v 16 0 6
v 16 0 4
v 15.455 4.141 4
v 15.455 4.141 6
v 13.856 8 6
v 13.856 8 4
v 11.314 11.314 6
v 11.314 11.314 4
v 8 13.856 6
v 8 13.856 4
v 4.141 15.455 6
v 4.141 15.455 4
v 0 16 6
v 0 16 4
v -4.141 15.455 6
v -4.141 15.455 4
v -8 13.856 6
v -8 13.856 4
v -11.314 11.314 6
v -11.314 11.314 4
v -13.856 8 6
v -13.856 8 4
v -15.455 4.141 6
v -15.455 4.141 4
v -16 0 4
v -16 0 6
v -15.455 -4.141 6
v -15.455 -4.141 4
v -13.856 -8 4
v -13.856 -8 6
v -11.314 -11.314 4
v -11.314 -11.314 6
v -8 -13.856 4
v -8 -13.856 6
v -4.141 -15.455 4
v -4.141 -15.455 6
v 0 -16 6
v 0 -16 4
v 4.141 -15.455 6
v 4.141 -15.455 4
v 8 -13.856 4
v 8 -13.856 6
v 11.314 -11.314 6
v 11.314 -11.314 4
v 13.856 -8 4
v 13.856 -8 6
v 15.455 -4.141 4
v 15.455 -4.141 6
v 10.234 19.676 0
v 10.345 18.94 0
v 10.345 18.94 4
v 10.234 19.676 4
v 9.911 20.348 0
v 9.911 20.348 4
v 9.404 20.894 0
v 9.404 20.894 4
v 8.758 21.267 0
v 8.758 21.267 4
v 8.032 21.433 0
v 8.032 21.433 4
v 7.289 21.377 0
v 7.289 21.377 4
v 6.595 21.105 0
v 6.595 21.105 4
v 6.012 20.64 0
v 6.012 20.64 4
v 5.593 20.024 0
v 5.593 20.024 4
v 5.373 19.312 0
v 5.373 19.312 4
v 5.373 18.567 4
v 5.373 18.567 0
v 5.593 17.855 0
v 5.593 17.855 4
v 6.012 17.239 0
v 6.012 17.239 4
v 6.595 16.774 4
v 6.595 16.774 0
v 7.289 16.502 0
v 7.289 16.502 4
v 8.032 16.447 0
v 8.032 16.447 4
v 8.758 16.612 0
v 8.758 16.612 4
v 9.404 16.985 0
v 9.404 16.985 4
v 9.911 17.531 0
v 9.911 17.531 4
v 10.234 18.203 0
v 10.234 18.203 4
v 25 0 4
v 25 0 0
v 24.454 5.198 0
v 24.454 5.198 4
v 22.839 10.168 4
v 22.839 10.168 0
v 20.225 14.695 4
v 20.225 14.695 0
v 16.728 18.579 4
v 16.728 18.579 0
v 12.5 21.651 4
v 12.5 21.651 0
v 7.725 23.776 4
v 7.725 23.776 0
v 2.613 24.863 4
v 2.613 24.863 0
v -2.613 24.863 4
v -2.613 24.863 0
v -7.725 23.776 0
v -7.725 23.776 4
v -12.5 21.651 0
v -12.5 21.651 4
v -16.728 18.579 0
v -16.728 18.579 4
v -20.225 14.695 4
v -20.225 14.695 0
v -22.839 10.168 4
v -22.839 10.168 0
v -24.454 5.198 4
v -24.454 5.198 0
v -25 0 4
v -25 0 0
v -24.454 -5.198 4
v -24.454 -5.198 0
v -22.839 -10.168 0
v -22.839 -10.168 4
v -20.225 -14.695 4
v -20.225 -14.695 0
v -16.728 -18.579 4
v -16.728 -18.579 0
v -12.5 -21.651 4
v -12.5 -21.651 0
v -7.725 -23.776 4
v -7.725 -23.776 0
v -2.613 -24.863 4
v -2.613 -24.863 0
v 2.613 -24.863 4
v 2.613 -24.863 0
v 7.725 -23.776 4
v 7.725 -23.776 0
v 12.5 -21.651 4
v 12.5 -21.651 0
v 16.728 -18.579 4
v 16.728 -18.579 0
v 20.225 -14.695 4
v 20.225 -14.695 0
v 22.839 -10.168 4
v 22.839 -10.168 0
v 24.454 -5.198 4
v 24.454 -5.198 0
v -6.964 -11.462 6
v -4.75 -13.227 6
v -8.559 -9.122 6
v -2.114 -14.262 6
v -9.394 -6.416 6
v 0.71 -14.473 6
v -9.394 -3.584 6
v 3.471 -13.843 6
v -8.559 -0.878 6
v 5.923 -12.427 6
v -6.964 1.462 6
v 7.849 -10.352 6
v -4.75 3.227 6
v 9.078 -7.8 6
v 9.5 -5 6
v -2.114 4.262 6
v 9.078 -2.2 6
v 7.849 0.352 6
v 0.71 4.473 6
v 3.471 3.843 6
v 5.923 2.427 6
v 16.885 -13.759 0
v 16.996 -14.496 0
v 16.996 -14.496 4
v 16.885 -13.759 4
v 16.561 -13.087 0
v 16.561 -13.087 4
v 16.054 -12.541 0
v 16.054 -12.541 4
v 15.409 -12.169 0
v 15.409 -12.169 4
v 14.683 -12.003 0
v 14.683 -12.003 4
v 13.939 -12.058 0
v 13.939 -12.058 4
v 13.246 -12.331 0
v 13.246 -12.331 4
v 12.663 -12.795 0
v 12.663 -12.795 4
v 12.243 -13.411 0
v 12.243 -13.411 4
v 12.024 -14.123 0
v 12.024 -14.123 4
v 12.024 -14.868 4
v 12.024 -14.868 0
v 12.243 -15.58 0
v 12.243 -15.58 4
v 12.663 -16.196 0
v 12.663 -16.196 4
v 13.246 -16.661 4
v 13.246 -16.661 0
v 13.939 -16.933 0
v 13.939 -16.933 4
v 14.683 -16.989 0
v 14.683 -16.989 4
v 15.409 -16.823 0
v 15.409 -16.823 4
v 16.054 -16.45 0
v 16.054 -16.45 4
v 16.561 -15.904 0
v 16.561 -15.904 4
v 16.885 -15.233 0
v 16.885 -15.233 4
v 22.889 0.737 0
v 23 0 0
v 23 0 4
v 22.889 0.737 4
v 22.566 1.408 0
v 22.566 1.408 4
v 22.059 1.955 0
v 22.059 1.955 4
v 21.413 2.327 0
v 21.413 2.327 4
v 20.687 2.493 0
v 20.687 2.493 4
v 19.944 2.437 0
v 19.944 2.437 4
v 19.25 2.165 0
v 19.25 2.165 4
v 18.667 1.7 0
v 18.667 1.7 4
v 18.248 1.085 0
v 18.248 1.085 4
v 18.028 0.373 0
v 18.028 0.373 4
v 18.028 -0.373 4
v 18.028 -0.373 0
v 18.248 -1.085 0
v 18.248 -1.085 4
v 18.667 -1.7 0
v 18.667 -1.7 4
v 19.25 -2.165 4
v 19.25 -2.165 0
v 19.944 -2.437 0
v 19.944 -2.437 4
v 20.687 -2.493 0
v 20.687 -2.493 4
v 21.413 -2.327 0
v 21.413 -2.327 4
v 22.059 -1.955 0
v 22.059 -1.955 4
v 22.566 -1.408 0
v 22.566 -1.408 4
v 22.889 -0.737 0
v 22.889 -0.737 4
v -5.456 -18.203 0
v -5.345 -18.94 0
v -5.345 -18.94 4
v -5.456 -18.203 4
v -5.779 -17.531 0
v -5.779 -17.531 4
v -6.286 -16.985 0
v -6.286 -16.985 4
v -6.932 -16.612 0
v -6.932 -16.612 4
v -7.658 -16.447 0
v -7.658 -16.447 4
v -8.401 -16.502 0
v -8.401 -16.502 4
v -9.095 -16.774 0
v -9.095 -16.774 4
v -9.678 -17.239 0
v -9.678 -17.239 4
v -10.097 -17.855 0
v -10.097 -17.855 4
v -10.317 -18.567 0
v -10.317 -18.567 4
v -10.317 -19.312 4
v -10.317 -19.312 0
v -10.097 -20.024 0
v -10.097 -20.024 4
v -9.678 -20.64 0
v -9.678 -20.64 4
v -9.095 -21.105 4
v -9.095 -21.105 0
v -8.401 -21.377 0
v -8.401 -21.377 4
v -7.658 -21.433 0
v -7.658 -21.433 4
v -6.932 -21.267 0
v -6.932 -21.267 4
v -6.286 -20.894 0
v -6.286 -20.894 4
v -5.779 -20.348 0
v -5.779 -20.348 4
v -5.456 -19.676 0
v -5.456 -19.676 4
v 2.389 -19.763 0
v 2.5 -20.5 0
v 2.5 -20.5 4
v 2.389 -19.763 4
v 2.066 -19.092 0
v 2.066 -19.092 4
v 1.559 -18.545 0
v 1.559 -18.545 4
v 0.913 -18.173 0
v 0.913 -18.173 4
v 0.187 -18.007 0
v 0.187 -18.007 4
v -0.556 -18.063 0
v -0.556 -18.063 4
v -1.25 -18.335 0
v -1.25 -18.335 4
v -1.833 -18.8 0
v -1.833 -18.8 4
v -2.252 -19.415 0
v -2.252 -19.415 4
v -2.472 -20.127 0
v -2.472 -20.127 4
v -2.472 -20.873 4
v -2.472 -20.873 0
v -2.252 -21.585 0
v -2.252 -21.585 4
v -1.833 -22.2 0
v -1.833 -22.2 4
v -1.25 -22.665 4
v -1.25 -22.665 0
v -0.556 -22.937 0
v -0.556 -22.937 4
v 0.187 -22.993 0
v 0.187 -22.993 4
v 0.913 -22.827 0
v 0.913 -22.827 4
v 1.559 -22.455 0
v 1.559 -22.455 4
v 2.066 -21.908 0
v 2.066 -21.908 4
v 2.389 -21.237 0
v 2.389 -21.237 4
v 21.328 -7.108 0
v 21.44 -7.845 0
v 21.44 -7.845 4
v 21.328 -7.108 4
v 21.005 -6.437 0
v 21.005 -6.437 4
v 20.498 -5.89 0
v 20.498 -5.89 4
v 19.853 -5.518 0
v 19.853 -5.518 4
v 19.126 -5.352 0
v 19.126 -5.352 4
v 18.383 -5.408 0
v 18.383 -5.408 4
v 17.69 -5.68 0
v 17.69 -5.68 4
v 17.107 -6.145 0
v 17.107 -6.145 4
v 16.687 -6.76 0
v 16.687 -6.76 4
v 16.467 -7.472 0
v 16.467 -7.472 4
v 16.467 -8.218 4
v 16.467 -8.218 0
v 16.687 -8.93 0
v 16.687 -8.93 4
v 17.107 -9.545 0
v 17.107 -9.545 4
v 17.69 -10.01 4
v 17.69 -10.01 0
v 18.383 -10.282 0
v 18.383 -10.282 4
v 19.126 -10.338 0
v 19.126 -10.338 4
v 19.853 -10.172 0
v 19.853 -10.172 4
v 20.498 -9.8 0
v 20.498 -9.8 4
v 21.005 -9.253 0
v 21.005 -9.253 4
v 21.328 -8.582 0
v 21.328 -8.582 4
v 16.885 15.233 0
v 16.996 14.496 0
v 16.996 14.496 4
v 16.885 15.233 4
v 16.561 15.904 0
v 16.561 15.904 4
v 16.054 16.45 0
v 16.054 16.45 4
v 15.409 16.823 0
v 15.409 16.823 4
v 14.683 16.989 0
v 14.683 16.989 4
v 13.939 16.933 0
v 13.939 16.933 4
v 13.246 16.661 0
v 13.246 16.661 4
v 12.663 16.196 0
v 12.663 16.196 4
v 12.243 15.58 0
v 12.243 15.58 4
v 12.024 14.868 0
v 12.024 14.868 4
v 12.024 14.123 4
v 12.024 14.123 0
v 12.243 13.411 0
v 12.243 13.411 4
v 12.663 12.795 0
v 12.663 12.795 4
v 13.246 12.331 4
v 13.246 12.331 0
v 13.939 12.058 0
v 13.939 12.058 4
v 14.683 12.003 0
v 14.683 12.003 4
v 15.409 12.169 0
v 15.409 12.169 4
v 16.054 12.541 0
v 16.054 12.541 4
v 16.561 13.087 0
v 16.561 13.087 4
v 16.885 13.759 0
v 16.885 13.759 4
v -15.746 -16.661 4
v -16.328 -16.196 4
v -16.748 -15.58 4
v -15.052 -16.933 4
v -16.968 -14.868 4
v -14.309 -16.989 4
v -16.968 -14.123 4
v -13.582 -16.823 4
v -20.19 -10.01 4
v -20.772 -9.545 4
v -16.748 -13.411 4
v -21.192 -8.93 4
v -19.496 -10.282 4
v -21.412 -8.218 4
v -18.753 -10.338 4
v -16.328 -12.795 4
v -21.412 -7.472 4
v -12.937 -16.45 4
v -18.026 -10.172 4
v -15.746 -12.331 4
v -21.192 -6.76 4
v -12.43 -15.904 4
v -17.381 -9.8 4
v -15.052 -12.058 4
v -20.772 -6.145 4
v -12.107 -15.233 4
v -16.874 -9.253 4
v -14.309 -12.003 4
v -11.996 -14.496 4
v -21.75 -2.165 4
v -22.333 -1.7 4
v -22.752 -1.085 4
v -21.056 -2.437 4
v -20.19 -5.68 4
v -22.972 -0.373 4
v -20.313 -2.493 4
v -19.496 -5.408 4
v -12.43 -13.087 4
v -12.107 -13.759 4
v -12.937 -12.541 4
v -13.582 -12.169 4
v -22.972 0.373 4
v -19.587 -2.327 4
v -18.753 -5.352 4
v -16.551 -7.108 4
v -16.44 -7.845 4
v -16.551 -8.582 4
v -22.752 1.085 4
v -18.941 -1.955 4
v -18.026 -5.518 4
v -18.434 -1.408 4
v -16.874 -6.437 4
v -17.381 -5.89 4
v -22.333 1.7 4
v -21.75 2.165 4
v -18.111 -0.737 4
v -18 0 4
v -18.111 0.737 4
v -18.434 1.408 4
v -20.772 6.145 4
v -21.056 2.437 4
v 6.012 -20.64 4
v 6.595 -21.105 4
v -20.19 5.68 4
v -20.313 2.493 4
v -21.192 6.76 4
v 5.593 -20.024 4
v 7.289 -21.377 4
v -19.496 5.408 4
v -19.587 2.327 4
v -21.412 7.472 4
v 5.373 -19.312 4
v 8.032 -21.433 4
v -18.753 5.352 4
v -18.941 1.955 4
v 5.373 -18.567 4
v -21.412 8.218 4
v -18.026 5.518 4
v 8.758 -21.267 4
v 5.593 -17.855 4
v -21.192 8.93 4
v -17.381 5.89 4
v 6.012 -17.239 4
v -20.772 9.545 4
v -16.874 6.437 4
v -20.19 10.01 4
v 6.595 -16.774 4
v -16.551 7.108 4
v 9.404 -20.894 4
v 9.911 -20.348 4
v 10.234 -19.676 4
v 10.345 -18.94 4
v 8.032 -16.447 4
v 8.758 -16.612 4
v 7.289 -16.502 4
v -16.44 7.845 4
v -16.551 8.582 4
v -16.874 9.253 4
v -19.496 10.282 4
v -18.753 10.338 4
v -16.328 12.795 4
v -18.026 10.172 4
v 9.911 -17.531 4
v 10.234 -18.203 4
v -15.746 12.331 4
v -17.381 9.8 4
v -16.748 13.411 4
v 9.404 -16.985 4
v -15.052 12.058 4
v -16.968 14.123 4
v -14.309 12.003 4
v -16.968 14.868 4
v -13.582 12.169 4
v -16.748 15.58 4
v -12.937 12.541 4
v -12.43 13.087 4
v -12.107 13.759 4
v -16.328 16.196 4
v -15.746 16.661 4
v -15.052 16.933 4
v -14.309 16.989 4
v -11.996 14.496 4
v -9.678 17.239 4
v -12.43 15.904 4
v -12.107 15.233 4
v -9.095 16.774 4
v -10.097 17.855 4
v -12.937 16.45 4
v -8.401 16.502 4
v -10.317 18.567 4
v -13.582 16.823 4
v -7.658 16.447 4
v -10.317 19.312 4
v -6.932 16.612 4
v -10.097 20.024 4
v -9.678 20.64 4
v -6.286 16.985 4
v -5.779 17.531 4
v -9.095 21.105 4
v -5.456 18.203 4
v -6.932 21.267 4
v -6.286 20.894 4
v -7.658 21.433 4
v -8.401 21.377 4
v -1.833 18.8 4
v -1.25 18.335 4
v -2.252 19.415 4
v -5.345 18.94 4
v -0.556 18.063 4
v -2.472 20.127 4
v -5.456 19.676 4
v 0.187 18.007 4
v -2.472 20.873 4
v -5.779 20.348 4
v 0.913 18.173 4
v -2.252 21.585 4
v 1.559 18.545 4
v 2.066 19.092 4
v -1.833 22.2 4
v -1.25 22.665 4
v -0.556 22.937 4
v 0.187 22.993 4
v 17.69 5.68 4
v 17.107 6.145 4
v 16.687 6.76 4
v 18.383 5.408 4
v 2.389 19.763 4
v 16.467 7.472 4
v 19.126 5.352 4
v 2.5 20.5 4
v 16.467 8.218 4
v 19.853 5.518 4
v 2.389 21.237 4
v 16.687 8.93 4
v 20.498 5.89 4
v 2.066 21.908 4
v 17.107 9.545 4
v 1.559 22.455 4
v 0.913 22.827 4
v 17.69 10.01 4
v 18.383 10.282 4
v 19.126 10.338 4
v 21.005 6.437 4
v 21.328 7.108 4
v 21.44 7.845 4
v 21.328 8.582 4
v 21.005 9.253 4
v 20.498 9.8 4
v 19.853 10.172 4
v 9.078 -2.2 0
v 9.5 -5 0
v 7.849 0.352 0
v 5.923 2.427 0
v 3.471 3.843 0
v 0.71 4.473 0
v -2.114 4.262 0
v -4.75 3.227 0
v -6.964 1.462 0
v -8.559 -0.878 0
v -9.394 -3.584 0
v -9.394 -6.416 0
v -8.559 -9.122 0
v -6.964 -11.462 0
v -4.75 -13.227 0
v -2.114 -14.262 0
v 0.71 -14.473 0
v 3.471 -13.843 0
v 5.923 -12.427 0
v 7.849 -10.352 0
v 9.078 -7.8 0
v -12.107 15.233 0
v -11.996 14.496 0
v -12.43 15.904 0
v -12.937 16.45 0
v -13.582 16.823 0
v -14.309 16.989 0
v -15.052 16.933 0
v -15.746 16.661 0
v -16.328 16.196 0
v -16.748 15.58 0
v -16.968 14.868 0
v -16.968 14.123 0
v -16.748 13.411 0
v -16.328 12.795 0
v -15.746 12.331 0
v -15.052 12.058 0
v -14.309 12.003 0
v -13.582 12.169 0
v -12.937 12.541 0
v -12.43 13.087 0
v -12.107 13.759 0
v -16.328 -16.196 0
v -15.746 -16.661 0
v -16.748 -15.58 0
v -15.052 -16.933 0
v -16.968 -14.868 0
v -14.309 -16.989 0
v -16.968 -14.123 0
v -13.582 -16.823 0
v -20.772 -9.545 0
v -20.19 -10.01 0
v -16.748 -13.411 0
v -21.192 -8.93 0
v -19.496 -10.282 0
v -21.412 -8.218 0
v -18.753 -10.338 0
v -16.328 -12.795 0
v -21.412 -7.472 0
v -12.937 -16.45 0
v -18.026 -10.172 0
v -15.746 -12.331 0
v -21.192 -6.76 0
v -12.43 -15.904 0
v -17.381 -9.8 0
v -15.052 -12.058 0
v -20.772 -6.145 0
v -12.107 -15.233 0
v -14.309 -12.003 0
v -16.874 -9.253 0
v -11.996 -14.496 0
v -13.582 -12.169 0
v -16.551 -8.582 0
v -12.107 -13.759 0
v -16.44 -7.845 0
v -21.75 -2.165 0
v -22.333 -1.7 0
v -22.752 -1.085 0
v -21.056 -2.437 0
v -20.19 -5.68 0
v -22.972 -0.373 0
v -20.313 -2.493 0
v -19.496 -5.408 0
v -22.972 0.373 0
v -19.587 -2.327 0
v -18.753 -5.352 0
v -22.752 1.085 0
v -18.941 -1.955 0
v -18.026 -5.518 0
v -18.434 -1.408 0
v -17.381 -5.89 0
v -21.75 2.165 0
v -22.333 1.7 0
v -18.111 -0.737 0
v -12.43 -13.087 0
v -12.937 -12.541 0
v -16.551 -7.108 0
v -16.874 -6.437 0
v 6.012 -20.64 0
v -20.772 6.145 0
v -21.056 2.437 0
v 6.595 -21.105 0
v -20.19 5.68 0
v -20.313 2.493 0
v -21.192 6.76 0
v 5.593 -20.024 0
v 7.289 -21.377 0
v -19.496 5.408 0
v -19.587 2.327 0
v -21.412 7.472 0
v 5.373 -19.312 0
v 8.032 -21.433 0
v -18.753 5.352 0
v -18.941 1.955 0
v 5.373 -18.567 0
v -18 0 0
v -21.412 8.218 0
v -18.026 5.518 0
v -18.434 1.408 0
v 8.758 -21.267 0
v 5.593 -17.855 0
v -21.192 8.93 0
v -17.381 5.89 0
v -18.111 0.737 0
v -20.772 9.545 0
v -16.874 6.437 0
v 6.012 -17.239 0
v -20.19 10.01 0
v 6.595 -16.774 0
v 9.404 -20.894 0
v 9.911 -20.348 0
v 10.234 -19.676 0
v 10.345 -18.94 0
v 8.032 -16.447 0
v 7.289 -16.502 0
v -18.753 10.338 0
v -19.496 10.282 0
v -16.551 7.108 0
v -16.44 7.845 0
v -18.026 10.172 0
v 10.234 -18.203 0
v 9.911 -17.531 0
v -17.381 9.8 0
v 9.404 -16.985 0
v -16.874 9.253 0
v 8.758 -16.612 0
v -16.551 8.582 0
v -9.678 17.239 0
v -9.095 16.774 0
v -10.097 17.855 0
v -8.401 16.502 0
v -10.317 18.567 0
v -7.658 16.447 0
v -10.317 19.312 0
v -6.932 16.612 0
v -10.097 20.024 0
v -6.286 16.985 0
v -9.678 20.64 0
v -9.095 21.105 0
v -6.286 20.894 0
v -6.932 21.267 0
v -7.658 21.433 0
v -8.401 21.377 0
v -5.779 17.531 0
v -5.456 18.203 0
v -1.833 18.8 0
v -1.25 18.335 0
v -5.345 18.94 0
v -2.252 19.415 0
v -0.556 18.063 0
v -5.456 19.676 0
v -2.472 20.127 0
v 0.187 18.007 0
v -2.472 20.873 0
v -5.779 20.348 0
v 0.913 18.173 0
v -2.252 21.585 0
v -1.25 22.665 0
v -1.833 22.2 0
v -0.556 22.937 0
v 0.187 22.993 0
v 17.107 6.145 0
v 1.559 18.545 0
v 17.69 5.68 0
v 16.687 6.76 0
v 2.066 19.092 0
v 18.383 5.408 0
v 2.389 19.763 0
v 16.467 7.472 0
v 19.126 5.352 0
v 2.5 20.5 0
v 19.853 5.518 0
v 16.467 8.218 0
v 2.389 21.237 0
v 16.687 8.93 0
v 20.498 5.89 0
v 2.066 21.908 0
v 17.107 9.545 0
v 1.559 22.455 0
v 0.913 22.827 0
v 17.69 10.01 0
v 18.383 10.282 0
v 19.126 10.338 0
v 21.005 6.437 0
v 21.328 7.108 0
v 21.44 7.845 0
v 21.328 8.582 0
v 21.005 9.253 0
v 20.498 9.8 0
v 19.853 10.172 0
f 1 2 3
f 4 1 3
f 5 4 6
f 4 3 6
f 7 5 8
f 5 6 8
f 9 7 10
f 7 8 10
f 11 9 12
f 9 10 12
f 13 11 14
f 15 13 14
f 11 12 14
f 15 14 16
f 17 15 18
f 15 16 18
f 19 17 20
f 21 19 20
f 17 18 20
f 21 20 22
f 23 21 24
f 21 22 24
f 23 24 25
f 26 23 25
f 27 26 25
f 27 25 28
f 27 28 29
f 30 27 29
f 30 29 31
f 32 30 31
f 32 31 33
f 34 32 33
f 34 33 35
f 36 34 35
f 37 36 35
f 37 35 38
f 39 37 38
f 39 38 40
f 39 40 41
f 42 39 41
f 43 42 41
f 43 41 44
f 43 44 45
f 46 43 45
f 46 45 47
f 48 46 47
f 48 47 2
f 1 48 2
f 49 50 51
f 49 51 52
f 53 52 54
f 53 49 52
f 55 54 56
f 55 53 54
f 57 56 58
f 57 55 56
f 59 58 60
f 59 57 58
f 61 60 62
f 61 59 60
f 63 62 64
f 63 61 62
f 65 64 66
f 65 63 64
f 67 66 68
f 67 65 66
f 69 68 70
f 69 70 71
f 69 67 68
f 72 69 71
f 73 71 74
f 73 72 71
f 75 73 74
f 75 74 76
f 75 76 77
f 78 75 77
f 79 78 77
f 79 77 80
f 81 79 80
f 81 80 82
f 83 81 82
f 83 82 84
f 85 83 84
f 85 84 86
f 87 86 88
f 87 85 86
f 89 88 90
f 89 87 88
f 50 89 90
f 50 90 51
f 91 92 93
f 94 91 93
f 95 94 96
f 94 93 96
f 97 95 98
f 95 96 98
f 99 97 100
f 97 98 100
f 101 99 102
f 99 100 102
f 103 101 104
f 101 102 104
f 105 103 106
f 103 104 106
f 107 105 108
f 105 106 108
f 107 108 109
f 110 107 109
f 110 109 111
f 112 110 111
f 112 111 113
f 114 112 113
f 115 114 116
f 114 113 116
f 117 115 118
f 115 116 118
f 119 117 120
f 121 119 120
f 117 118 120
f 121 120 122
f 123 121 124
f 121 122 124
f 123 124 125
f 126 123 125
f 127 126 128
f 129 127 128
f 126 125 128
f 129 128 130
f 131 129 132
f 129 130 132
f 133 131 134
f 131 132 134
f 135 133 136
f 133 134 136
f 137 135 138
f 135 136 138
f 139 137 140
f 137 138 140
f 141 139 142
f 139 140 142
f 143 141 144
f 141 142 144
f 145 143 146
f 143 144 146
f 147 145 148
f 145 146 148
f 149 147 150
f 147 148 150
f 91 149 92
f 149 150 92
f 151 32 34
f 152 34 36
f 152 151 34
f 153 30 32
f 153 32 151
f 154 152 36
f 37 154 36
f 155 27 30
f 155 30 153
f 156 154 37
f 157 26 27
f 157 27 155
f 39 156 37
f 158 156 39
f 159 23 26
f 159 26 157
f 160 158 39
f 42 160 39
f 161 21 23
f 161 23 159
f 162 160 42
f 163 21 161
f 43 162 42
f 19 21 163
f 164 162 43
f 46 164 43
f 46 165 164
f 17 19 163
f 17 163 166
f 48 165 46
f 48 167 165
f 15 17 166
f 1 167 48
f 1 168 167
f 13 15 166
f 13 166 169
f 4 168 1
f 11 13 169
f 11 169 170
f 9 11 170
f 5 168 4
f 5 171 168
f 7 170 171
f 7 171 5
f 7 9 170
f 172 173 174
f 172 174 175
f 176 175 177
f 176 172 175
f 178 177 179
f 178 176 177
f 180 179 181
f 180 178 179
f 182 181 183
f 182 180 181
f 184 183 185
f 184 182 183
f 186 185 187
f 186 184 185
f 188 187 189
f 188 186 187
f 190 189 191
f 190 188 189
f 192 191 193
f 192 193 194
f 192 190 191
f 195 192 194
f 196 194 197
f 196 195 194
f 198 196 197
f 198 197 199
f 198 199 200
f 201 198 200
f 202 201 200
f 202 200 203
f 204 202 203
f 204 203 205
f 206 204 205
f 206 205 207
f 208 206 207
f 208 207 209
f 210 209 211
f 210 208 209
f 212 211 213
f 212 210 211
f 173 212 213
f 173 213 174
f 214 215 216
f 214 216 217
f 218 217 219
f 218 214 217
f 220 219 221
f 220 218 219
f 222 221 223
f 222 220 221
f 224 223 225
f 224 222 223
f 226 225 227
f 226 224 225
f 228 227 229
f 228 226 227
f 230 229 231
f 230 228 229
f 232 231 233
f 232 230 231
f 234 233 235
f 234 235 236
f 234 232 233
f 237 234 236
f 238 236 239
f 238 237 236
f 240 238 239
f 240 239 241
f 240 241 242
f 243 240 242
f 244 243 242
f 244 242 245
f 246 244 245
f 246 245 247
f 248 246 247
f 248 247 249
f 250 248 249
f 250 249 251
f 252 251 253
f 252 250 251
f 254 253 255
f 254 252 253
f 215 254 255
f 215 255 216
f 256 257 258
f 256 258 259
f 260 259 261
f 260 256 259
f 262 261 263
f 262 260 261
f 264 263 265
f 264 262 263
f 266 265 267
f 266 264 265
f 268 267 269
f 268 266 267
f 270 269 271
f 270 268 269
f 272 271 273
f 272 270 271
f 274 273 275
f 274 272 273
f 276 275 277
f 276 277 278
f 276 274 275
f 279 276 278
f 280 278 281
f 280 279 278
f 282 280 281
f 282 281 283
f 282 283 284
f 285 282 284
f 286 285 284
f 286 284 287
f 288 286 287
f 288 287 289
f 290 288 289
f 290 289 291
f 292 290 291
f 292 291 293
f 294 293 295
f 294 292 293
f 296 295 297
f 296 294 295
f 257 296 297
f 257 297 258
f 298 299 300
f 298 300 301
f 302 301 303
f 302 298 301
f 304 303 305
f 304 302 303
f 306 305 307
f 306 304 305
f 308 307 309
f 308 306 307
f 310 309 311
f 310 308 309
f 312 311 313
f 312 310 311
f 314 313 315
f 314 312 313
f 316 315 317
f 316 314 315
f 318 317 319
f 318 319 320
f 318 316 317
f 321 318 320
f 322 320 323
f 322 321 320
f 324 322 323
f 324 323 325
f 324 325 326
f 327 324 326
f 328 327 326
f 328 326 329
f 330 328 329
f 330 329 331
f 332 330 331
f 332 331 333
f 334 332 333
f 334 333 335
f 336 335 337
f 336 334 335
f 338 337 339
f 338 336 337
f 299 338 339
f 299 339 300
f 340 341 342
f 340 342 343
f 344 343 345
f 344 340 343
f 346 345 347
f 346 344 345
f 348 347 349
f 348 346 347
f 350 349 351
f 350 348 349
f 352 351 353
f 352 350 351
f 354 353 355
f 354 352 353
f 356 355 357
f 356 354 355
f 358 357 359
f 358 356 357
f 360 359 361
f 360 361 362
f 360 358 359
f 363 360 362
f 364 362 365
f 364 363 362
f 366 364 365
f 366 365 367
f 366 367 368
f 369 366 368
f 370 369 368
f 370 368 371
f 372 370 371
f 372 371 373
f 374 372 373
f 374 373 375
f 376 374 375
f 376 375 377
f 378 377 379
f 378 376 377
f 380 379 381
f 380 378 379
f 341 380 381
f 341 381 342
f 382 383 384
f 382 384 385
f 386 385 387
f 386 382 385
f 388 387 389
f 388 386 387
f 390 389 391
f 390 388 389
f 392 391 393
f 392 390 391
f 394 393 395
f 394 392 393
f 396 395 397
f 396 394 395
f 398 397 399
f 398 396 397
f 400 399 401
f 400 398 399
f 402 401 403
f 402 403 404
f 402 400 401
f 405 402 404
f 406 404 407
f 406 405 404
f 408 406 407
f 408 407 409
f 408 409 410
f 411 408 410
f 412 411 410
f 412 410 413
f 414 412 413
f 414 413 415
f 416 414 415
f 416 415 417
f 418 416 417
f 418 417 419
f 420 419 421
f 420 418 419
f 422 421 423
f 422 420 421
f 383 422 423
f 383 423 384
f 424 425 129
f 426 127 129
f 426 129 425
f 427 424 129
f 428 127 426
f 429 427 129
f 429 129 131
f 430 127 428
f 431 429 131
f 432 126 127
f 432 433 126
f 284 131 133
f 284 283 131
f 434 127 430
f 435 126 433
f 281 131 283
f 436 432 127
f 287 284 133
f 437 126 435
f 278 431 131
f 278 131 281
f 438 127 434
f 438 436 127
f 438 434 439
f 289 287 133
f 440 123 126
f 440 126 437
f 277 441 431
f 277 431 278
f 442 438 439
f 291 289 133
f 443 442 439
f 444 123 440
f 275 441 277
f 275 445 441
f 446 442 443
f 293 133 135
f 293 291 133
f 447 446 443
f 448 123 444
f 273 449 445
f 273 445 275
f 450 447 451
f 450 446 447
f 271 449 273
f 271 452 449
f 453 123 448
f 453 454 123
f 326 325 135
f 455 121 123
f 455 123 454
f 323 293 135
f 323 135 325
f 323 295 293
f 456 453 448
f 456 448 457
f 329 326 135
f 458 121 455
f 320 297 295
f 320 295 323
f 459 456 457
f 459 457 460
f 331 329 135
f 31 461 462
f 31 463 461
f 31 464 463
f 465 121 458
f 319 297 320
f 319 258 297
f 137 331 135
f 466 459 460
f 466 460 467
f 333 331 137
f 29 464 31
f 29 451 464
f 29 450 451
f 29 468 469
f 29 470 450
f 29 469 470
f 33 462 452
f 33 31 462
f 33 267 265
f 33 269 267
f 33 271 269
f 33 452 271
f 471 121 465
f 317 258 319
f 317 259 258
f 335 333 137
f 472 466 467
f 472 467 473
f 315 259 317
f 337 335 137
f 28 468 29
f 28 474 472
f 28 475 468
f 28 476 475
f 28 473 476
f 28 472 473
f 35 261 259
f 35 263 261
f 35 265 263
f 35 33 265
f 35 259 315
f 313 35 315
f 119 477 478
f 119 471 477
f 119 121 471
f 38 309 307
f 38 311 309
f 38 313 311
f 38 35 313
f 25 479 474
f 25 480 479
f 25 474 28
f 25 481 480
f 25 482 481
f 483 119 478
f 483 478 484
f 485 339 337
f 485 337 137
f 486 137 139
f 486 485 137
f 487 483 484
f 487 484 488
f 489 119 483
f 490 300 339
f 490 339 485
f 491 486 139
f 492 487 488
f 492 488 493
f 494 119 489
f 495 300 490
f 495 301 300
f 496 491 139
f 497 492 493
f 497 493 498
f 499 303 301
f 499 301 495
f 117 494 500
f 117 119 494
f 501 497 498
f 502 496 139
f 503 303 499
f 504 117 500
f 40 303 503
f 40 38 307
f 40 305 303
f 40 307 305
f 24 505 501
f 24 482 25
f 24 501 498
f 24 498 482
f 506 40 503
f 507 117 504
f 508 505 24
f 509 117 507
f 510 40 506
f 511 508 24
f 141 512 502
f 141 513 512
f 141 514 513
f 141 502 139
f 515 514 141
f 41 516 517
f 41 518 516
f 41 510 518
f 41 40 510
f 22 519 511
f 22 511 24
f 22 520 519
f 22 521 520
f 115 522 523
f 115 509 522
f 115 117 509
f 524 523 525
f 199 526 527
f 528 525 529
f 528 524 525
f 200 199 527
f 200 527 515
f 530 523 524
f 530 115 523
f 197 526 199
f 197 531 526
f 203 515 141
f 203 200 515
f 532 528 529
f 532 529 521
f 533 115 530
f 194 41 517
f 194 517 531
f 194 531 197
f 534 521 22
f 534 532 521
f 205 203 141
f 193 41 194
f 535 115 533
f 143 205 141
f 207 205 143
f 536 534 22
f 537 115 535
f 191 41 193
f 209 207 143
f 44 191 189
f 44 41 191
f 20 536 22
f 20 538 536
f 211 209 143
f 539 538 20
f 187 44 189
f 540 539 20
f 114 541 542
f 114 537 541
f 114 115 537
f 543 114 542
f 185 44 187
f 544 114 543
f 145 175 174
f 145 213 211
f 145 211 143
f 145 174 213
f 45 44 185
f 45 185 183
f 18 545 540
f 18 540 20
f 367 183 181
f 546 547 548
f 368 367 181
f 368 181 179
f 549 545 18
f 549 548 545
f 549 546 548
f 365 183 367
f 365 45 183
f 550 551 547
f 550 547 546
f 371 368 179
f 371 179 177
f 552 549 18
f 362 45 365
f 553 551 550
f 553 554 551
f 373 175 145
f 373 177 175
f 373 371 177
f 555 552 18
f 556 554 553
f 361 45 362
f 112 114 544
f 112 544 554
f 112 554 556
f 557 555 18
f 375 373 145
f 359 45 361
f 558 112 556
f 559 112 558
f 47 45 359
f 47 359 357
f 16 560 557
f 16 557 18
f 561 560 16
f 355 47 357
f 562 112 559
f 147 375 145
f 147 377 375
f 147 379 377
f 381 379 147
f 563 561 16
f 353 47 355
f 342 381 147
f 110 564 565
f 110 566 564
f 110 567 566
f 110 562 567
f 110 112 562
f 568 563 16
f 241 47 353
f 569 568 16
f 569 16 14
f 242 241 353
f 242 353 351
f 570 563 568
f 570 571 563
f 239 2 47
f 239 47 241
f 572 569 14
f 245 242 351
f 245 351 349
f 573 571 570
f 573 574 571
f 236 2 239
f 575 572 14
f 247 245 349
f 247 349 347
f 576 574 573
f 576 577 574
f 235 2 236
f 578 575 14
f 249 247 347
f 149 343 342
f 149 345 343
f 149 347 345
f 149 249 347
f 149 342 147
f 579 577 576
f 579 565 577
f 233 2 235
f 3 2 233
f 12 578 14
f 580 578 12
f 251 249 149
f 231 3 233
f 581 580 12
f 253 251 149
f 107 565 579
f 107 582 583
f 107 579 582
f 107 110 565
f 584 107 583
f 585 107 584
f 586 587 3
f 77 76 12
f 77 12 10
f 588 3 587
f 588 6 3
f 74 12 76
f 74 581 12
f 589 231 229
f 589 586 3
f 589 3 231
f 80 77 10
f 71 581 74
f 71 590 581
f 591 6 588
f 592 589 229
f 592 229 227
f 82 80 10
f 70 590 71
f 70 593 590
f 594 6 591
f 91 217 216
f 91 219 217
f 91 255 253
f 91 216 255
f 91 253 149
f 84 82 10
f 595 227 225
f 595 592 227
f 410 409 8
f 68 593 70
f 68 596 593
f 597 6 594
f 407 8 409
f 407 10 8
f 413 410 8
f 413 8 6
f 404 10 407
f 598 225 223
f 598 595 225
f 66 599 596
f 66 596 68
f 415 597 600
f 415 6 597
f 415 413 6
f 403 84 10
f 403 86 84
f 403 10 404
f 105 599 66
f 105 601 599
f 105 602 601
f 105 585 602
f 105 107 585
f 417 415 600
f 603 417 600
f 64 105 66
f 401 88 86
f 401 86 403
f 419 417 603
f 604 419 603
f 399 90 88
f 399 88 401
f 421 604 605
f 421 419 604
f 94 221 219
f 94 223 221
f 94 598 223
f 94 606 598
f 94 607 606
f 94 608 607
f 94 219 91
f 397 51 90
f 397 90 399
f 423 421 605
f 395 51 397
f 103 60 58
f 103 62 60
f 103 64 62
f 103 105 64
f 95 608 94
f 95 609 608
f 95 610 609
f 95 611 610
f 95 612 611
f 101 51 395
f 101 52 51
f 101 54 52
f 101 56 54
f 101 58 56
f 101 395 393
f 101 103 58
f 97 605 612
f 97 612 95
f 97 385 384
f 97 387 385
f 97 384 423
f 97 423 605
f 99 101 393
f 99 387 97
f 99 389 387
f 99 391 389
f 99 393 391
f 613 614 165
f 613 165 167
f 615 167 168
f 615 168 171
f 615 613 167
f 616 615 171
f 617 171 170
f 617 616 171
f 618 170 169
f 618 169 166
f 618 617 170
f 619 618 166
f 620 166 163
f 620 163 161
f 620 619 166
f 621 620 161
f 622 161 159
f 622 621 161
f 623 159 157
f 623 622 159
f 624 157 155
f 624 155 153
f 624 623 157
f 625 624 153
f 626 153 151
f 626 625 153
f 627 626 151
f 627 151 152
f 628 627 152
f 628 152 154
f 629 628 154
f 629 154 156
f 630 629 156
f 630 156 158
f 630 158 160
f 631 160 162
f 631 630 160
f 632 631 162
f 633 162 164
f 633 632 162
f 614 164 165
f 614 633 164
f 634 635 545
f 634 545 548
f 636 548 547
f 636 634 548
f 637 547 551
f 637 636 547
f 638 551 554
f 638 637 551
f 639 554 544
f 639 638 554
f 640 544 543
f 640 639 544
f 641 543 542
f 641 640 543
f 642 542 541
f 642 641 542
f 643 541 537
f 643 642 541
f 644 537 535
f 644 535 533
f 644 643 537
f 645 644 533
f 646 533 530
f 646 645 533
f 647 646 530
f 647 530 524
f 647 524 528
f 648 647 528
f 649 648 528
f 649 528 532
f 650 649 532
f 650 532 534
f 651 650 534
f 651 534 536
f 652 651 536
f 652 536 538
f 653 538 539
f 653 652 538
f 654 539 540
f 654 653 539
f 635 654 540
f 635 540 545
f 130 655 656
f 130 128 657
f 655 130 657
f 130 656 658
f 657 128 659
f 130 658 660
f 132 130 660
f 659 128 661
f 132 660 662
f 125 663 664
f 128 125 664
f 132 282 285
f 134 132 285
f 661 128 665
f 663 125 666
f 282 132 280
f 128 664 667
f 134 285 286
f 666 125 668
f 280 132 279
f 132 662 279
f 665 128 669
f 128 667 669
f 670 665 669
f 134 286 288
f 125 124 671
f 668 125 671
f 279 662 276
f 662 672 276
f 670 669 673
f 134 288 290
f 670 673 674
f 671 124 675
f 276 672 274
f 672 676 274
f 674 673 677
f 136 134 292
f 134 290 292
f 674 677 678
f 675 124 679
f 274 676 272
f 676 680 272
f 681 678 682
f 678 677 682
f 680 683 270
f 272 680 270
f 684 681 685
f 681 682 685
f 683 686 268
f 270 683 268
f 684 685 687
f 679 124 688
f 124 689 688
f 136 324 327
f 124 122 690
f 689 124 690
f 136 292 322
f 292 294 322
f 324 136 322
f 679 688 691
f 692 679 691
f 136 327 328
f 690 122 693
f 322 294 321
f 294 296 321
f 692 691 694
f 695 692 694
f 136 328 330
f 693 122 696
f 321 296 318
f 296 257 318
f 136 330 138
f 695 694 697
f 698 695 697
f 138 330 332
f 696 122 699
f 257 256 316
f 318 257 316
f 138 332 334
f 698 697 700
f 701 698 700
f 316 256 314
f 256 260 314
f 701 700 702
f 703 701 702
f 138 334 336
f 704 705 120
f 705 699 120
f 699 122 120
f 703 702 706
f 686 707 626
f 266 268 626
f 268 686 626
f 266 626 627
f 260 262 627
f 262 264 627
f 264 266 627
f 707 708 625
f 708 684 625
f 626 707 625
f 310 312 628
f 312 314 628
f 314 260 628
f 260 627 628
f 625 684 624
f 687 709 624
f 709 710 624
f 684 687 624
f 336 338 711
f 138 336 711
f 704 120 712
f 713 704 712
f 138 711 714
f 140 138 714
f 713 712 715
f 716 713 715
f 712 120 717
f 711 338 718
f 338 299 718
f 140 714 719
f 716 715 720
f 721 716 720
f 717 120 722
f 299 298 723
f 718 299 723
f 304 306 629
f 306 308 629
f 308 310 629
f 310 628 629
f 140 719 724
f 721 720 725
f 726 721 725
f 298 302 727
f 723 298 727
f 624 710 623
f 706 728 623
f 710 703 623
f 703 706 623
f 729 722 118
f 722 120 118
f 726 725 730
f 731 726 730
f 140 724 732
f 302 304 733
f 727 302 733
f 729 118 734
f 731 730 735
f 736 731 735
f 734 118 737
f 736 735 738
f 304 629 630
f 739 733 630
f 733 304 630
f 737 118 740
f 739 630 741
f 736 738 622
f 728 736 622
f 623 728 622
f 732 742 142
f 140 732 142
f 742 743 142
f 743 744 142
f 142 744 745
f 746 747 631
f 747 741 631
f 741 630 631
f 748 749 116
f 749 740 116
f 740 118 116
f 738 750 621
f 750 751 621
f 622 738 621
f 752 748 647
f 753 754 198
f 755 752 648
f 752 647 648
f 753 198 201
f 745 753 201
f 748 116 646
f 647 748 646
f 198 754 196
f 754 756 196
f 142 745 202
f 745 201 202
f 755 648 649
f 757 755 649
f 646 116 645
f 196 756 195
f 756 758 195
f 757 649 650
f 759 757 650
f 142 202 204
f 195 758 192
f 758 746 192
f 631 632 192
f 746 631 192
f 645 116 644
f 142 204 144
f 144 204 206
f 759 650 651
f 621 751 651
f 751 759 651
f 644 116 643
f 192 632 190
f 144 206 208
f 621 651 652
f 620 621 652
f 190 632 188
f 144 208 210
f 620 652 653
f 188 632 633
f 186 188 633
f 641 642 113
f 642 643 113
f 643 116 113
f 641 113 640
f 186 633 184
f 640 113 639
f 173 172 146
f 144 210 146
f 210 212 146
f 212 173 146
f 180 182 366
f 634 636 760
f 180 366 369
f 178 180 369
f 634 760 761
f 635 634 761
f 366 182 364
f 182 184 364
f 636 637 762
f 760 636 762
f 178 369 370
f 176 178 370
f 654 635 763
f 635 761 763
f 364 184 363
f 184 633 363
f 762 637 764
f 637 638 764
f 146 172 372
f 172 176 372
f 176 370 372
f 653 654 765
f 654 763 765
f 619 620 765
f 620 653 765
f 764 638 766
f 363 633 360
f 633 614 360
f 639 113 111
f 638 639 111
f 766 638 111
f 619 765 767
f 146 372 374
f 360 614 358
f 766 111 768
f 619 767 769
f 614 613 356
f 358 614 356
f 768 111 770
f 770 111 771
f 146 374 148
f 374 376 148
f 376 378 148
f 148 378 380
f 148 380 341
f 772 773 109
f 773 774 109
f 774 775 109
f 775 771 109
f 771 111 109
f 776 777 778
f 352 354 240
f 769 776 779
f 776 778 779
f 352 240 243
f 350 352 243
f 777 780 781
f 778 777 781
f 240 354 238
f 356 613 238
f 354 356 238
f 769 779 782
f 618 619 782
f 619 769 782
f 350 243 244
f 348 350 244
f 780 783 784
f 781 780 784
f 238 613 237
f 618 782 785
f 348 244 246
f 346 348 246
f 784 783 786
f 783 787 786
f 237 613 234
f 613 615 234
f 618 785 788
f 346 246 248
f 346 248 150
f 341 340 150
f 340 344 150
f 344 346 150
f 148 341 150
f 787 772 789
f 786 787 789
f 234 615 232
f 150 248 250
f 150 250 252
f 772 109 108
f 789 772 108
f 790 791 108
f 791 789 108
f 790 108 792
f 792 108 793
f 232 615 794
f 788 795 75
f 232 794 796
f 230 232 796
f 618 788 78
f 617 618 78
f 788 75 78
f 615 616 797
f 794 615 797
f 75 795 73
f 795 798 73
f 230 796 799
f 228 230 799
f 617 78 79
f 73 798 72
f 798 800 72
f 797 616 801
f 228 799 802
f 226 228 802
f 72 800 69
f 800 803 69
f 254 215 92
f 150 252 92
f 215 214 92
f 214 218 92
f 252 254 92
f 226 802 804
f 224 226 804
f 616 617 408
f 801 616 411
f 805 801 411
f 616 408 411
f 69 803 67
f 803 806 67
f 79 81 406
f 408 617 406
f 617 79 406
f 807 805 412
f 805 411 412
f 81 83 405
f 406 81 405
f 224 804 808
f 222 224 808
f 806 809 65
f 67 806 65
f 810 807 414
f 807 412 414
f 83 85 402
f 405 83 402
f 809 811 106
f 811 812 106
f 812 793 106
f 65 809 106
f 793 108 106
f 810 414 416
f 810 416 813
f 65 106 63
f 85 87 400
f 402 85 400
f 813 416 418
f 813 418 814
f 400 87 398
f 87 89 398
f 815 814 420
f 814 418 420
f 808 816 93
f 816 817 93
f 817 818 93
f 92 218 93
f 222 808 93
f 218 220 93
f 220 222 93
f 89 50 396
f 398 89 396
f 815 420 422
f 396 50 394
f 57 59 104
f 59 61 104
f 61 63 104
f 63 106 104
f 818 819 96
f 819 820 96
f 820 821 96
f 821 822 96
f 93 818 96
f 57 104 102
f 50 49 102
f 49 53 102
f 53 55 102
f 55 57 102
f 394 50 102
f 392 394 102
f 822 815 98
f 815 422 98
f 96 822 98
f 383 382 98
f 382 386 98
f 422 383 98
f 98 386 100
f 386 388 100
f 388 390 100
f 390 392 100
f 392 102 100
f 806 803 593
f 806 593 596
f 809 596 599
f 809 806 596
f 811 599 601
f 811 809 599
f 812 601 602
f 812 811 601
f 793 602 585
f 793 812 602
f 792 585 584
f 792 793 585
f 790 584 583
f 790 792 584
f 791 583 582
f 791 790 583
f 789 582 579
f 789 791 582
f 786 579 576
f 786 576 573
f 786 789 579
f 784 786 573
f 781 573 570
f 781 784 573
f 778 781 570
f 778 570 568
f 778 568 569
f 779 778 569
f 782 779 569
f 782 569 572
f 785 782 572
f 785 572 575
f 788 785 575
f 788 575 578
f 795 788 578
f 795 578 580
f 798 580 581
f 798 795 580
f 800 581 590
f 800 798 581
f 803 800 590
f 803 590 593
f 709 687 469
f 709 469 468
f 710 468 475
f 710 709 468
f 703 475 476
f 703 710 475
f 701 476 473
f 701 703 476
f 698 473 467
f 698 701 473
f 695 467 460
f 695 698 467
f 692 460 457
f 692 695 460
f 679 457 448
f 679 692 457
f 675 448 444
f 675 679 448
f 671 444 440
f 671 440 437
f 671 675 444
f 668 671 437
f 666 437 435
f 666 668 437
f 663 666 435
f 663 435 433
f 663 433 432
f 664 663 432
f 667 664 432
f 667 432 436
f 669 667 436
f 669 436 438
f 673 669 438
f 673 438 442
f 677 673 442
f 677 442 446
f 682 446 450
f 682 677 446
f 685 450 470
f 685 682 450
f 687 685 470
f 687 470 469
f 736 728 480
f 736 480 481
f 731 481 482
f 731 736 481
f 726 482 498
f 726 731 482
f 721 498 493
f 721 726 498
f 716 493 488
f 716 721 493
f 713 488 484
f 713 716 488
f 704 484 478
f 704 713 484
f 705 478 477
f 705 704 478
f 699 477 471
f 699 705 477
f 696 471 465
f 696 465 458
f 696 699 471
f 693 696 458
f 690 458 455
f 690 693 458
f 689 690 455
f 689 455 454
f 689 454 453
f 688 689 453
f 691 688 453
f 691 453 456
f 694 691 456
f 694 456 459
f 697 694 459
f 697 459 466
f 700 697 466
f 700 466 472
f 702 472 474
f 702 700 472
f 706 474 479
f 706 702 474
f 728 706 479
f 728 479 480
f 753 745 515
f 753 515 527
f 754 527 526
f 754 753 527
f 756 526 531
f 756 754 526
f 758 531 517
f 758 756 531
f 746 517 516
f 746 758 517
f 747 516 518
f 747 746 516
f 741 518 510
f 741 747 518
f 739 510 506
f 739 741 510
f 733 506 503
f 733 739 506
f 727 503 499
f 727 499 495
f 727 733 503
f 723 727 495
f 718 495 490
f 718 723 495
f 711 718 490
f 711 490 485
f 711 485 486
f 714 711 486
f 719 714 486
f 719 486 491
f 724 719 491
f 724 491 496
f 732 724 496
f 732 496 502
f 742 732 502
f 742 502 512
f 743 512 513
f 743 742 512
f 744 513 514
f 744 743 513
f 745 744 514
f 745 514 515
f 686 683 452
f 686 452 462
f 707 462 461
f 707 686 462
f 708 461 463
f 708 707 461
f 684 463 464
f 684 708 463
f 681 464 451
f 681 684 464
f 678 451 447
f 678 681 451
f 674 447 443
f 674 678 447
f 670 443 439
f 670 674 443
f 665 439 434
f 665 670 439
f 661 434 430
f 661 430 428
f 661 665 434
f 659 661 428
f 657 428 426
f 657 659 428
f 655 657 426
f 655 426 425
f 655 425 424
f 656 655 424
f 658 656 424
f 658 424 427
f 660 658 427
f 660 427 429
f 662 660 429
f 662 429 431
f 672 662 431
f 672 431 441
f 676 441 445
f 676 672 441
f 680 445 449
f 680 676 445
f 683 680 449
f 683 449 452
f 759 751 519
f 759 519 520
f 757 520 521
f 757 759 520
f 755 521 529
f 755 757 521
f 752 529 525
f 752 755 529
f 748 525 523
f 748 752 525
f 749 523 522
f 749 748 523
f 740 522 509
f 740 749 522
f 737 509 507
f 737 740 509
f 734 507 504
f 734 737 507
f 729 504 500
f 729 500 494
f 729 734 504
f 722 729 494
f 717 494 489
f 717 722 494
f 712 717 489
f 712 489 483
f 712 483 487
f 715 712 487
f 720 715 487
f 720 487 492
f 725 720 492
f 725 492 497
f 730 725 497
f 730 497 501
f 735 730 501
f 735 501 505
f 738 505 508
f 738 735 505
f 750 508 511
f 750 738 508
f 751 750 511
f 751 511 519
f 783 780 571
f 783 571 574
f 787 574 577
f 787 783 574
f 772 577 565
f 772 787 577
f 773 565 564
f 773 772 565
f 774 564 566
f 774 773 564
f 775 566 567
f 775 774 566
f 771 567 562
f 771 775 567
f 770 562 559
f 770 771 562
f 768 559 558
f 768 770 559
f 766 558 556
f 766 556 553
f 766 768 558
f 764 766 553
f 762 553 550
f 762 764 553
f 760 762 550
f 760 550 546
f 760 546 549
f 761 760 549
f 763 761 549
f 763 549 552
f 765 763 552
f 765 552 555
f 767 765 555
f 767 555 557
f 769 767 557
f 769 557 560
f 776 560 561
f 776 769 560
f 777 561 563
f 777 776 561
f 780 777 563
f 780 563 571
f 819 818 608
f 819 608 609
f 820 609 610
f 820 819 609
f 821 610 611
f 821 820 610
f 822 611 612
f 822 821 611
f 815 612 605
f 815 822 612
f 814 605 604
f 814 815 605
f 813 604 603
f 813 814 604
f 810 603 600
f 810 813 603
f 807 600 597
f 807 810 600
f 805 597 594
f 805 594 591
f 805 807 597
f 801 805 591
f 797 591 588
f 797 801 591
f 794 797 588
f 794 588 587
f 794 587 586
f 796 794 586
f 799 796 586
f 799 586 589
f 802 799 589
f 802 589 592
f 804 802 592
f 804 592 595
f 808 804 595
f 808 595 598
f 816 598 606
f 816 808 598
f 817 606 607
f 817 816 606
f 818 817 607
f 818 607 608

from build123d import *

# Parameters (mm, degrees)
SKETCH1_R           = 16
SKETCH1_R_2         = 9.5
BOSS_EXTRUDE1_DEPTH = 6
SKETCH1_3_R         = 25
SKETCH1_3_R_2       = 2.5
SKETCH1_3_R_3       = 16
BOSS_EXTRUDE2_DEPTH = 4


with BuildPart() as part:
    # Sketch1 → Boss-Extrude1 (new body)
    with BuildSketch(Plane(origin=(0, 0, 0), x_dir=(0, 1, 0), z_dir=(0, 0, 1))):
        Circle(SKETCH1_R)
        with Locations((-5, 0)):
            Circle(SKETCH1_R_2, mode=Mode.SUBTRACT)
    extrude(amount=BOSS_EXTRUDE1_DEPTH)

    # Sketch1<3> → Boss-Extrude2 (add)
    with BuildSketch(Plane(origin=(0, 0, 0), x_dir=(0, 1, 0), z_dir=(0, 0, 1))):
        Circle(SKETCH1_3_R)
        with Locations((-14.495689014, -14.495689014)):
            Circle(SKETCH1_3_R_2, mode=Mode.SUBTRACT)
        with Locations((-7.845010363, -18.939530416)):
            Circle(SKETCH1_3_R_2, mode=Mode.SUBTRACT)
        with Locations((0, -20.5)):
            Circle(SKETCH1_3_R_2, mode=Mode.SUBTRACT)
        with Locations((-18.939530416, -7.845010363)):
            Circle(SKETCH1_3_R_2, mode=Mode.SUBTRACT)
        with Locations((-20.5, 0)):
            Circle(SKETCH1_3_R_2, mode=Mode.SUBTRACT)
        with Locations((7.845010363, -18.939530416)):
            Circle(SKETCH1_3_R_2, mode=Mode.SUBTRACT)
        with Locations((14.495689014, -14.495689014)):
            Circle(SKETCH1_3_R_2, mode=Mode.SUBTRACT)
        with Locations((18.939530416, -7.845010363)):
            Circle(SKETCH1_3_R_2, mode=Mode.SUBTRACT)
        with Locations((20.5, 0)):
            Circle(SKETCH1_3_R_2, mode=Mode.SUBTRACT)
        with Locations((-18.939530416, 7.845010363)):
            Circle(SKETCH1_3_R_2, mode=Mode.SUBTRACT)
        with Locations((-14.495689014, 14.495689014)):
            Circle(SKETCH1_3_R_2, mode=Mode.SUBTRACT)
        with Locations((-7.845010363, 18.939530416)):
            Circle(SKETCH1_3_R_2, mode=Mode.SUBTRACT)
        Circle(SKETCH1_3_R_3, mode=Mode.SUBTRACT)
        with Locations((18.939530416, 7.845010363)):
            Circle(SKETCH1_3_R_2, mode=Mode.SUBTRACT)
        with Locations((0, 20.5)):
            Circle(SKETCH1_3_R_2, mode=Mode.SUBTRACT)
        with Locations((7.845010363, 18.939530416)):
            Circle(SKETCH1_3_R_2, mode=Mode.SUBTRACT)
        with Locations((14.495689014, 14.495689014)):
            Circle(SKETCH1_3_R_2, mode=Mode.SUBTRACT)
    extrude(amount=BOSS_EXTRUDE2_DEPTH)


solid = part.part
